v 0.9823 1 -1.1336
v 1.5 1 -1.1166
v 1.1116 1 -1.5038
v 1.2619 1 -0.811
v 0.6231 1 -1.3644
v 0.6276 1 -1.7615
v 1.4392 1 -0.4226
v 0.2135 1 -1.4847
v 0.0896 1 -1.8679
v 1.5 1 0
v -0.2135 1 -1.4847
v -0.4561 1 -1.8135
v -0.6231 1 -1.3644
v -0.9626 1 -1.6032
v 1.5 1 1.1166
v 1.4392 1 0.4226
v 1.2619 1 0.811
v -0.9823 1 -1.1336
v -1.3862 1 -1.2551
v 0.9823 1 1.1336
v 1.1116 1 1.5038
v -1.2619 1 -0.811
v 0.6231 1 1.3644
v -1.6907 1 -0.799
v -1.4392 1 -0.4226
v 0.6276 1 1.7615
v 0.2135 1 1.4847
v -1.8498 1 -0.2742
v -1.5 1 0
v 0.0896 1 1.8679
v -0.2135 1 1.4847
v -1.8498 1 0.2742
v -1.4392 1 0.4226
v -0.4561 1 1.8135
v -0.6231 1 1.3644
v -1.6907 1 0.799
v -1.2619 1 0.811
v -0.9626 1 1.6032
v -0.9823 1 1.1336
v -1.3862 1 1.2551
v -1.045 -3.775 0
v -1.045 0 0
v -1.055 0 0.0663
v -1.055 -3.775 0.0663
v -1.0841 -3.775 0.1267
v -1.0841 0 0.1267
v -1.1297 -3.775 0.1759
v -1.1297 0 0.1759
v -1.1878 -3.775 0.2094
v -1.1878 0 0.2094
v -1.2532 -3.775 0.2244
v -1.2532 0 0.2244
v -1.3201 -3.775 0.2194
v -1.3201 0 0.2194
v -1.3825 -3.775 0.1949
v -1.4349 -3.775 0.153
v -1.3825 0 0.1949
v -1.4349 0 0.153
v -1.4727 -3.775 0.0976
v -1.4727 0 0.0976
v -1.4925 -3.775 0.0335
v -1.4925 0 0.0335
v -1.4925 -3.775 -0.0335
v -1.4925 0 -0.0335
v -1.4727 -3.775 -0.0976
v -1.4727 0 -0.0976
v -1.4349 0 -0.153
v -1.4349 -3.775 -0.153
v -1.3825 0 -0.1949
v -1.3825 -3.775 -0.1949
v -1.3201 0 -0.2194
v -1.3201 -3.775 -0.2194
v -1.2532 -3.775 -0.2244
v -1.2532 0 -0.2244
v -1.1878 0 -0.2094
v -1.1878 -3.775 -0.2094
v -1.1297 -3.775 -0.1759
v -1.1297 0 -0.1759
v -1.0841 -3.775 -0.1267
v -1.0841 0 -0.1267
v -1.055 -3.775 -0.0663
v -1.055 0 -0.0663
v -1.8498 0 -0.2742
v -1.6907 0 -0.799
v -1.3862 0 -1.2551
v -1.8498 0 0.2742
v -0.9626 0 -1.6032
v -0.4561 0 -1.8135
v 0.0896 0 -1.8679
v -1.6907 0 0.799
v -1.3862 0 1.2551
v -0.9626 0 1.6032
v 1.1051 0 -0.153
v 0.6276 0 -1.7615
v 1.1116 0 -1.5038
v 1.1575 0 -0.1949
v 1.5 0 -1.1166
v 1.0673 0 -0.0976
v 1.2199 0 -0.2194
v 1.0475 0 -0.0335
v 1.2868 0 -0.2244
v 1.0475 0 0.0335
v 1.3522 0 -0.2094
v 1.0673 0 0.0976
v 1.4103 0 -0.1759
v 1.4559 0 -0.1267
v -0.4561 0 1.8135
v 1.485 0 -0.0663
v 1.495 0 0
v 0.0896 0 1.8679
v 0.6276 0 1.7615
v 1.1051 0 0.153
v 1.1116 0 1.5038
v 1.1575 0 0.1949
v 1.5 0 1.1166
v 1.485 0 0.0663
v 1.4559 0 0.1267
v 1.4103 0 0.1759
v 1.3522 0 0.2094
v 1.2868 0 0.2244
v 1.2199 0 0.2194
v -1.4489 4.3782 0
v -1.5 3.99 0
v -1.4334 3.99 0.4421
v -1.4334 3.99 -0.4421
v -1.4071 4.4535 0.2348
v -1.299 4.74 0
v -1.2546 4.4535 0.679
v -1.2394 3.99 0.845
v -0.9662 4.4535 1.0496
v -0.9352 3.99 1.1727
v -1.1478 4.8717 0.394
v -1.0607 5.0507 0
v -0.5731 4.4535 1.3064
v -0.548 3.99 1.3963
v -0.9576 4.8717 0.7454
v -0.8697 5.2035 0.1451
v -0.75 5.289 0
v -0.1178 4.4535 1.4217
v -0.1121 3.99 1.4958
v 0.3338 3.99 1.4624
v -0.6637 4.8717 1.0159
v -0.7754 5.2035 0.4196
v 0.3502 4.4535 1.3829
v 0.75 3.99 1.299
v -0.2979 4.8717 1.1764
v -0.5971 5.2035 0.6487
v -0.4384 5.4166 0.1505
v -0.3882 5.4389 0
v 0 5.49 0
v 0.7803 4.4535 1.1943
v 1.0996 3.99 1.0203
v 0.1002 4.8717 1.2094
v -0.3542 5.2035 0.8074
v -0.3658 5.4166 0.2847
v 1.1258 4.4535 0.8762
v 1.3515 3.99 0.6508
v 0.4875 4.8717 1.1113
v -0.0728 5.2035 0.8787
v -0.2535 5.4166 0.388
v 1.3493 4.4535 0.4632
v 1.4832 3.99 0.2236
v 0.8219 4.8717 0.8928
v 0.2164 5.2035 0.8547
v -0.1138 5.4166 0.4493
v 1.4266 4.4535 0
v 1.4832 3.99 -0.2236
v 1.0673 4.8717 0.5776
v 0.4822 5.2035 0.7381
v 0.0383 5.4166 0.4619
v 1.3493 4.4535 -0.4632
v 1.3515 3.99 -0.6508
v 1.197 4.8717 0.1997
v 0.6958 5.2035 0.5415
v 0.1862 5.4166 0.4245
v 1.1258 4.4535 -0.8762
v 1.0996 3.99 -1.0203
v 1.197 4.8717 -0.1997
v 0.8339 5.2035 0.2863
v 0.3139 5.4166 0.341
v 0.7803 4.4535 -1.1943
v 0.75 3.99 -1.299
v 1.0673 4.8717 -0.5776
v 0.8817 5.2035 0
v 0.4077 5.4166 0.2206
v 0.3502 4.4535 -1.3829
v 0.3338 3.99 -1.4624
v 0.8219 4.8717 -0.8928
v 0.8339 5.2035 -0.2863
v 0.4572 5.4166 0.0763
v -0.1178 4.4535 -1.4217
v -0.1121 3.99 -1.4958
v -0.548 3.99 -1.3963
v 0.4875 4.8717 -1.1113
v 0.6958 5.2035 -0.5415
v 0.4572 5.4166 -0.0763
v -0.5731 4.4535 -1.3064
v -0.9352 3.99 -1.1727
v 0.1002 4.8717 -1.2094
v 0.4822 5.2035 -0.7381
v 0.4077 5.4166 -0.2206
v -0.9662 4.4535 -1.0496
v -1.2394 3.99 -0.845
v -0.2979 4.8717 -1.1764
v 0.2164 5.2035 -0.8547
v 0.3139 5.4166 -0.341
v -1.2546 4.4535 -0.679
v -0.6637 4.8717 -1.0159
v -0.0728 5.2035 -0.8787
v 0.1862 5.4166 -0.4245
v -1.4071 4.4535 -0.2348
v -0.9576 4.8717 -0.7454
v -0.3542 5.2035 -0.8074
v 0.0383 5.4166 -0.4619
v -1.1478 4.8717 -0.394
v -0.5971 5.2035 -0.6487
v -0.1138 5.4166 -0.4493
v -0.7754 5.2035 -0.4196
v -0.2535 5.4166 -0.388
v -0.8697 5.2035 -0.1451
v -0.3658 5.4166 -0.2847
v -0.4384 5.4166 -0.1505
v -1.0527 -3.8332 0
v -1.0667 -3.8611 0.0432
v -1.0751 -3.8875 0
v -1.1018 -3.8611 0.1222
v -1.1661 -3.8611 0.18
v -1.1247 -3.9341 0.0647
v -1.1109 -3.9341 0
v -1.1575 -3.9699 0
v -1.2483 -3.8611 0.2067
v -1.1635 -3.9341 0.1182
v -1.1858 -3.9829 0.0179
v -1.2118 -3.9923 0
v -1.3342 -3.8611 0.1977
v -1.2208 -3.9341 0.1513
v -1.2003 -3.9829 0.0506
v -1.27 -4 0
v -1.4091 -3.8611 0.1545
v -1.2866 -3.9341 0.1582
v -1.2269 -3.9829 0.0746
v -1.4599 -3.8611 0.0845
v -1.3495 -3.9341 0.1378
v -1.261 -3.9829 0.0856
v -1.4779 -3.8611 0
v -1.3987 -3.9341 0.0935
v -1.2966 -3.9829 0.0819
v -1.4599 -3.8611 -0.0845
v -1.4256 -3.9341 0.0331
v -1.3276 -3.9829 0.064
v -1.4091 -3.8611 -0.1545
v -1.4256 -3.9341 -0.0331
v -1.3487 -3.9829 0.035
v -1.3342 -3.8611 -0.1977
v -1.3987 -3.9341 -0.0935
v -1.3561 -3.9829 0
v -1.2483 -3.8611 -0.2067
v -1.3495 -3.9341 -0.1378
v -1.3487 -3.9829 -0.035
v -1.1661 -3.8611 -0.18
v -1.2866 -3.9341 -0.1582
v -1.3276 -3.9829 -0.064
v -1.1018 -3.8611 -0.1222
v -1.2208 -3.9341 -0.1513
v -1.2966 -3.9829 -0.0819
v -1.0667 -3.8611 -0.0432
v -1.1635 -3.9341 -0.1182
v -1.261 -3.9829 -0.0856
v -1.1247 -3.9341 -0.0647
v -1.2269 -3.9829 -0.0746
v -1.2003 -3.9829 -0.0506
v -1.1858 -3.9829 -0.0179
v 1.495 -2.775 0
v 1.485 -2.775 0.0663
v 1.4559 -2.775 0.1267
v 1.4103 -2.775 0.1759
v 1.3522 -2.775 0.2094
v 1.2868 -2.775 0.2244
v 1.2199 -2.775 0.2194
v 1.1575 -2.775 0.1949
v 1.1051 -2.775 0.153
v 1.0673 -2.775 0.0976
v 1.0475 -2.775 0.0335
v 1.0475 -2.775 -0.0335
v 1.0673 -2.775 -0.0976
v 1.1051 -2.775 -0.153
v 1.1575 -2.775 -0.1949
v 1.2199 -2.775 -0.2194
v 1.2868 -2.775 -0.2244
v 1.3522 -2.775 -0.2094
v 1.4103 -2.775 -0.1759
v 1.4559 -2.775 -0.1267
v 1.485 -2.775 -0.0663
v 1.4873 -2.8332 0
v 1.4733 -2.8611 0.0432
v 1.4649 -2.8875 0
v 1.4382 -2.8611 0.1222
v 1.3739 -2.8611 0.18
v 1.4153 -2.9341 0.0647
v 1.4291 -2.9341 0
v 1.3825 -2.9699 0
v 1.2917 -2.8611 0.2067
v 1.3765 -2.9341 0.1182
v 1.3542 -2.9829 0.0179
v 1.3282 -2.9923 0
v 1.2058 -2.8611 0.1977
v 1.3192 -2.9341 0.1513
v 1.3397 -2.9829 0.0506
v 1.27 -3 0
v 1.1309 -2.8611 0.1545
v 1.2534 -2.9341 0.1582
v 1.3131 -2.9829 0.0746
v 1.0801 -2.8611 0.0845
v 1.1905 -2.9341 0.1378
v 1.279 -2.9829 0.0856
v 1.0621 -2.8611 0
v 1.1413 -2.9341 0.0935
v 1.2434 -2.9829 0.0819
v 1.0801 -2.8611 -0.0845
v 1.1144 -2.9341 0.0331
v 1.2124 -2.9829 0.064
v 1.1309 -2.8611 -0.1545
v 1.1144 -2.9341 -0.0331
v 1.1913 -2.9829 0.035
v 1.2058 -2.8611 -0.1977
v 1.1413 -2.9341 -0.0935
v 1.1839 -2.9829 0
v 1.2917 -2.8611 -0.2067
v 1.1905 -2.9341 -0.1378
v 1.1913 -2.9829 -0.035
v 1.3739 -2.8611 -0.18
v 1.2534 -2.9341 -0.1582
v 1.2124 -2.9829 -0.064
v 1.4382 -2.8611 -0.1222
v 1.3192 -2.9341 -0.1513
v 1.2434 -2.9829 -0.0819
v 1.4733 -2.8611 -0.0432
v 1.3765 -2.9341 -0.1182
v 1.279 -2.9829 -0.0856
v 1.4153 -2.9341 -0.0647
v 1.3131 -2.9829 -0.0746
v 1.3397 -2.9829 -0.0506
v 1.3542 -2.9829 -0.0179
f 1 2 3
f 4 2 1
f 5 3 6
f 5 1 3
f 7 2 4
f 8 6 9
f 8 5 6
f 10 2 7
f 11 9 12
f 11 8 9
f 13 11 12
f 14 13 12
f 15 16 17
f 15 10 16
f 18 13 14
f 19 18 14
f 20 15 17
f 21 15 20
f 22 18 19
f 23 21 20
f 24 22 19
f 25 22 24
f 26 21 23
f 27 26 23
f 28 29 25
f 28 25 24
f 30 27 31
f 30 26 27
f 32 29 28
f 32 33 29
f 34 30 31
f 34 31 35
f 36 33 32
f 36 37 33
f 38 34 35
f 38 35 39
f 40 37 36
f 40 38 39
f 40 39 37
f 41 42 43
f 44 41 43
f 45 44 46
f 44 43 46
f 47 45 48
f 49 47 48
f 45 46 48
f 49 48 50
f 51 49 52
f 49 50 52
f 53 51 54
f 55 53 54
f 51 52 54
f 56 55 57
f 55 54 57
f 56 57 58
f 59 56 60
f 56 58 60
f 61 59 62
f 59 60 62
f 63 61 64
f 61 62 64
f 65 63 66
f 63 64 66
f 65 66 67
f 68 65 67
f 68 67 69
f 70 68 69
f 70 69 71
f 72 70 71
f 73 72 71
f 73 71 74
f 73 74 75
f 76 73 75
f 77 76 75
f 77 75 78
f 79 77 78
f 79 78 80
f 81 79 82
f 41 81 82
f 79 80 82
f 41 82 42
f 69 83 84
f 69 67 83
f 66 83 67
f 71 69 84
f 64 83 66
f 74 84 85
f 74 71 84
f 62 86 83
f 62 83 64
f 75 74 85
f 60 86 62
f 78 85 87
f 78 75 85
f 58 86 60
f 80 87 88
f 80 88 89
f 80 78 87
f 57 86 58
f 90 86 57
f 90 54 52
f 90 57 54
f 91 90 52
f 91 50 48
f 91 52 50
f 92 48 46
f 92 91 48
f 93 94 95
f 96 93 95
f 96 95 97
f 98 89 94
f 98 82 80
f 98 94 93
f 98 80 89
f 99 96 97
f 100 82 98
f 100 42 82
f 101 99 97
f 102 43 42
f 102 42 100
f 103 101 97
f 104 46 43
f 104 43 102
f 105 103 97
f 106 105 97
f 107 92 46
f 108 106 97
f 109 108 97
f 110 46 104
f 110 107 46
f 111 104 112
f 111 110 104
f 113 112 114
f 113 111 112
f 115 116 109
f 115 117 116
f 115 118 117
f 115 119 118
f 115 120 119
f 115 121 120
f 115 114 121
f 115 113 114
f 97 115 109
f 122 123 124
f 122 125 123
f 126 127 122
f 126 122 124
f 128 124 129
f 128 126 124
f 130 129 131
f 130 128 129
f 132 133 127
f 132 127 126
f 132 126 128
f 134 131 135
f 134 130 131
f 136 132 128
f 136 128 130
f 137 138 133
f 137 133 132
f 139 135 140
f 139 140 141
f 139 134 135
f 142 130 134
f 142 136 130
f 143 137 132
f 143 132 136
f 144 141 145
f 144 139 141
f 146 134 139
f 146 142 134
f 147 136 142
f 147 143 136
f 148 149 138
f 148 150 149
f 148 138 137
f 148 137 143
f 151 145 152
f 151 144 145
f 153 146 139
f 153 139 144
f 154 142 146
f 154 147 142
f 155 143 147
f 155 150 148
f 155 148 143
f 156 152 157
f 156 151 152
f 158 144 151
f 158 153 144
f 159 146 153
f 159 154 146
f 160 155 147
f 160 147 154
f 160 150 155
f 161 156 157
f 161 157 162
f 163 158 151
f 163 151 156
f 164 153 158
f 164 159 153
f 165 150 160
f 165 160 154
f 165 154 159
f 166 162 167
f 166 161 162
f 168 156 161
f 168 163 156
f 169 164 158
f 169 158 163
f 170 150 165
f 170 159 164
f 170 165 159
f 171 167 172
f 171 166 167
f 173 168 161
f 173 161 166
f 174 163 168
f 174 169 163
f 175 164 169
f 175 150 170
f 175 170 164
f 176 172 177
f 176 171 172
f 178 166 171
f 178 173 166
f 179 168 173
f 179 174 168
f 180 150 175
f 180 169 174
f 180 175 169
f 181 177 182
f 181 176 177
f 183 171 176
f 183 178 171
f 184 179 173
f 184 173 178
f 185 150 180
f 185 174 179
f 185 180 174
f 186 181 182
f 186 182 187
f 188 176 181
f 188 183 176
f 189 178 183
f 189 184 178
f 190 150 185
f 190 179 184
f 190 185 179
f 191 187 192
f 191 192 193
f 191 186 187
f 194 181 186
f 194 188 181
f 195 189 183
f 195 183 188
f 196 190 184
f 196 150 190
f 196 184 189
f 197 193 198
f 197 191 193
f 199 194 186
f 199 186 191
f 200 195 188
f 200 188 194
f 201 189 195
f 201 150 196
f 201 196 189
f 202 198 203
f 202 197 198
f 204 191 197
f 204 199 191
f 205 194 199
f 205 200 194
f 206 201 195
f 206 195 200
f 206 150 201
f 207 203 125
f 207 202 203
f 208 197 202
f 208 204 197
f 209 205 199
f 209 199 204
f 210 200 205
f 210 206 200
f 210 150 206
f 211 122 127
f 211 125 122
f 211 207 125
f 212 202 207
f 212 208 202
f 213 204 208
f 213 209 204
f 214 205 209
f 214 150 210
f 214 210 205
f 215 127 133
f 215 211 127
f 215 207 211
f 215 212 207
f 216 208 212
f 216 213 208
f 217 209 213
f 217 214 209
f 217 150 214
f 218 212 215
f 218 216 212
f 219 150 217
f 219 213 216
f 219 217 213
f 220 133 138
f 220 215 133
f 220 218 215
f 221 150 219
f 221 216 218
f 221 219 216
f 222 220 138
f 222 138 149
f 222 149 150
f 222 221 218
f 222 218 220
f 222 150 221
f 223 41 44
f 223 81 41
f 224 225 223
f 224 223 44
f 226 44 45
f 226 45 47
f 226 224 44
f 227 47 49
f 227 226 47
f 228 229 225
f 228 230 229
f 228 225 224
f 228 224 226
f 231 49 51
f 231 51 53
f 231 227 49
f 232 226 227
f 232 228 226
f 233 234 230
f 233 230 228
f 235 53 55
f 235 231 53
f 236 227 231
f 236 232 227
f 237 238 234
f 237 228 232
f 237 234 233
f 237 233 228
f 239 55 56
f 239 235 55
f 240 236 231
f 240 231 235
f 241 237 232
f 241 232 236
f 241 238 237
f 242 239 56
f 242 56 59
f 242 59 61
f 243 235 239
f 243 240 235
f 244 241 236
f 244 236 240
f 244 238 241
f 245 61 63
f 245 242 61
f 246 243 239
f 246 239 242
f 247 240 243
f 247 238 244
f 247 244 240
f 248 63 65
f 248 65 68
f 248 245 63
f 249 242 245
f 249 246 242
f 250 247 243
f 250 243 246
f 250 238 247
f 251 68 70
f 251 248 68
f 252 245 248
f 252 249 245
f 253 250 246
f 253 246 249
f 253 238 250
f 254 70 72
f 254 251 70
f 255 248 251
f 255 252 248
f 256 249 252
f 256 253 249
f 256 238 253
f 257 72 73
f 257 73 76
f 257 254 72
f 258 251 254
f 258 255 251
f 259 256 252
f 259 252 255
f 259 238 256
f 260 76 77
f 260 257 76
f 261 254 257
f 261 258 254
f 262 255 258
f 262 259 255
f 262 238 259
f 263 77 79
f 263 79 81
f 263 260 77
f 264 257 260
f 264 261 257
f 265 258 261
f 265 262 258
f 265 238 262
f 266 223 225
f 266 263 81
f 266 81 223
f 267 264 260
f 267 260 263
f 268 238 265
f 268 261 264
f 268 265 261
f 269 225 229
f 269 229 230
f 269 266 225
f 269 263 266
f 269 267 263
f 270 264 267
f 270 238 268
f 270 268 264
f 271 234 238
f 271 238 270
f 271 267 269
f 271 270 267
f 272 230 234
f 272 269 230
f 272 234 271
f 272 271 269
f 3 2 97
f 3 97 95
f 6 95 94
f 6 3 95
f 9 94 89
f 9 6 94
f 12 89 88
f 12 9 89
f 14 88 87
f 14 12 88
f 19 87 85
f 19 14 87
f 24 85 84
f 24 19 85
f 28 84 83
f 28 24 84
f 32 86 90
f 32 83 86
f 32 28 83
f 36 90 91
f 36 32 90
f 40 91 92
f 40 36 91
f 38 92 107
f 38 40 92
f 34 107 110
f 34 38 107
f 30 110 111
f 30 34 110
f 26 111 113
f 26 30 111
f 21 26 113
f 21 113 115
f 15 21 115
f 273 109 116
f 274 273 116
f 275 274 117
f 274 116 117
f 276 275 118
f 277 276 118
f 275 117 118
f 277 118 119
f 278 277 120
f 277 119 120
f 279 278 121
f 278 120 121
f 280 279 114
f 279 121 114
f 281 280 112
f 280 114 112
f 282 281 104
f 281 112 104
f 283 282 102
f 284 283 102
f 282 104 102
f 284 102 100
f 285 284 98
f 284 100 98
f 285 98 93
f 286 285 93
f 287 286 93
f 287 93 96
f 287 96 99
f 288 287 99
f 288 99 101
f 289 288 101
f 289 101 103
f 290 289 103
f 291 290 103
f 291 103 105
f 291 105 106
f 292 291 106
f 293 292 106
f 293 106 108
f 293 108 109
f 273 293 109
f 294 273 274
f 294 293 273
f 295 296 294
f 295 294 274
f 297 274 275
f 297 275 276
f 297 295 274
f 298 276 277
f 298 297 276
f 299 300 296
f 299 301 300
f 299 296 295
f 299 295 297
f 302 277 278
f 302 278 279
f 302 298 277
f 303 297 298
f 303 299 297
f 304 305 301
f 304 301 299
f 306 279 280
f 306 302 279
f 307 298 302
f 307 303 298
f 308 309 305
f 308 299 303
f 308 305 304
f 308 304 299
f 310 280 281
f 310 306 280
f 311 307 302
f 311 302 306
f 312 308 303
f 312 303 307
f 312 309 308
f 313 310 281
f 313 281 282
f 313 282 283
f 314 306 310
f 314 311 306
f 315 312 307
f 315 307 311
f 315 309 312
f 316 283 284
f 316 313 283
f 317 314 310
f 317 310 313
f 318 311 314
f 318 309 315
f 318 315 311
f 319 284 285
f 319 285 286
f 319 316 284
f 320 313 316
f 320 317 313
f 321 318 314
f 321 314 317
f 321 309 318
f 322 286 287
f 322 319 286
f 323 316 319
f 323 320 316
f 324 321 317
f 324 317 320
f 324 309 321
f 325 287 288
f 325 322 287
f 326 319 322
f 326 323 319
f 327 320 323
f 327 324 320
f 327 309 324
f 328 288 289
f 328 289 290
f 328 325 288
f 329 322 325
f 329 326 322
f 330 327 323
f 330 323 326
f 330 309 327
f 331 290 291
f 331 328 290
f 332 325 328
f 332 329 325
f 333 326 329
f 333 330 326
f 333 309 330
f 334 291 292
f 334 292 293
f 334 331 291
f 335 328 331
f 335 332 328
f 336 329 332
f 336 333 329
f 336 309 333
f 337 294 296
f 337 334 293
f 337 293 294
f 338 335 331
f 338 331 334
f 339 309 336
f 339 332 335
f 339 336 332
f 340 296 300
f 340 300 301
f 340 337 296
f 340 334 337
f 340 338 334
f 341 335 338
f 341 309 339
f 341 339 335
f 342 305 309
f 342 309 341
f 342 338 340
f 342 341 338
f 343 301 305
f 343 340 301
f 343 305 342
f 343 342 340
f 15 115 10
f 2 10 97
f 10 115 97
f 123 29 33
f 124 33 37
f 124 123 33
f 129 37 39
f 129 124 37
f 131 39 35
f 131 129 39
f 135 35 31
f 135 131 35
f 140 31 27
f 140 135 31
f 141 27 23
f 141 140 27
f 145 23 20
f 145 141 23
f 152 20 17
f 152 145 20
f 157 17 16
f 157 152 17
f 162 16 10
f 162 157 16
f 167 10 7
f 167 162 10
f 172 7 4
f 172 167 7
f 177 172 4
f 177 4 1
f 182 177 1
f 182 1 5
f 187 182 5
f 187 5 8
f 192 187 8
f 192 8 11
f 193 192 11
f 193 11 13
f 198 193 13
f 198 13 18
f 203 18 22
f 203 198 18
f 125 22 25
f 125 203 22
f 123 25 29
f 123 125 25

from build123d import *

# Parameters (mm, degrees)
CORTAR_EXTRUIR1_REACH   = 7.49
CROQUIS1_R              = 0.225
SALIENTE_EXTRUIR1_DEPTH = 4
CROQUIS2_R              = 0.225
CORTAR_EXTRUIR2_DEPTH   = 1
REDONDEO1_R             = 0.225


with BuildPart() as part:
    # Sketch2 → Revolve1 (revolve)
    with BuildSketch(Plane.XY):
        with BuildLine():
            Line((0, 0), (-1.87, 0))
            Line((-1.87, 0), (-1.87, 1))
            Line((-1.87, 1), (-1.5, 1))
            Line((-1.5, 1), (-1.5, 3.99))
            ThreePointArc((-1.5, 3.99), (-1.060660172, 5.050660172), (0, 5.49))
            Line((0, 5.49), (0, 0))
        make_face()
    revolve(axis=Axis((0, 0, 0), (0, 1, 0)))

    # Sketch3 → Cortar-Extruir1 (cut, up to next)
    with BuildSketch(Plane.XZ, mode=Mode.PRIVATE) as cortar_extruir1_sk1:
        Polygon((1.5, 20.122635641), (1.5, 1.116646766), (1.5, -1.116646766), (1.5, -20.122635641), (39.51197775, -20.122635641), (39.51197775, 20.122635641), align=None)
    cortar_extruir1_tool1 = extrude(cortar_extruir1_sk1.sketch, amount=-CORTAR_EXTRUIR1_REACH, mode=Mode.PRIVATE) & part.part
    add(cortar_extruir1_tool1.solids().sort_by_distance((20.505989, 0, 0))[0], mode=Mode.SUBTRACT)

    # Croquis1 → Saliente-Extruir1 (add)
    with BuildSketch(Plane.XZ):
        with Locations((1.27, 0)):
            Circle(CROQUIS1_R)
        with Locations((-1.27, 0)):
            Circle(CROQUIS1_R)
    extrude(amount=SALIENTE_EXTRUIR1_DEPTH)

    # Croquis2 → Cortar-Extruir2 (cut)
    with BuildSketch(Plane.XZ.offset(4)):
        with Locations((1.27, 0)):
            Circle(CROQUIS2_R)
    extrude(amount=-CORTAR_EXTRUIR2_DEPTH, mode=Mode.SUBTRACT)

    # Redondeo1
    redondeo1_edges = [part.edges().sort_by_distance(p)[0] for p in [
        (-1.495, -4, 0),
        (1.045, -3, 0),
    ]]
    fillet(redondeo1_edges, radius=REDONDEO1_R)


solid = part.part
